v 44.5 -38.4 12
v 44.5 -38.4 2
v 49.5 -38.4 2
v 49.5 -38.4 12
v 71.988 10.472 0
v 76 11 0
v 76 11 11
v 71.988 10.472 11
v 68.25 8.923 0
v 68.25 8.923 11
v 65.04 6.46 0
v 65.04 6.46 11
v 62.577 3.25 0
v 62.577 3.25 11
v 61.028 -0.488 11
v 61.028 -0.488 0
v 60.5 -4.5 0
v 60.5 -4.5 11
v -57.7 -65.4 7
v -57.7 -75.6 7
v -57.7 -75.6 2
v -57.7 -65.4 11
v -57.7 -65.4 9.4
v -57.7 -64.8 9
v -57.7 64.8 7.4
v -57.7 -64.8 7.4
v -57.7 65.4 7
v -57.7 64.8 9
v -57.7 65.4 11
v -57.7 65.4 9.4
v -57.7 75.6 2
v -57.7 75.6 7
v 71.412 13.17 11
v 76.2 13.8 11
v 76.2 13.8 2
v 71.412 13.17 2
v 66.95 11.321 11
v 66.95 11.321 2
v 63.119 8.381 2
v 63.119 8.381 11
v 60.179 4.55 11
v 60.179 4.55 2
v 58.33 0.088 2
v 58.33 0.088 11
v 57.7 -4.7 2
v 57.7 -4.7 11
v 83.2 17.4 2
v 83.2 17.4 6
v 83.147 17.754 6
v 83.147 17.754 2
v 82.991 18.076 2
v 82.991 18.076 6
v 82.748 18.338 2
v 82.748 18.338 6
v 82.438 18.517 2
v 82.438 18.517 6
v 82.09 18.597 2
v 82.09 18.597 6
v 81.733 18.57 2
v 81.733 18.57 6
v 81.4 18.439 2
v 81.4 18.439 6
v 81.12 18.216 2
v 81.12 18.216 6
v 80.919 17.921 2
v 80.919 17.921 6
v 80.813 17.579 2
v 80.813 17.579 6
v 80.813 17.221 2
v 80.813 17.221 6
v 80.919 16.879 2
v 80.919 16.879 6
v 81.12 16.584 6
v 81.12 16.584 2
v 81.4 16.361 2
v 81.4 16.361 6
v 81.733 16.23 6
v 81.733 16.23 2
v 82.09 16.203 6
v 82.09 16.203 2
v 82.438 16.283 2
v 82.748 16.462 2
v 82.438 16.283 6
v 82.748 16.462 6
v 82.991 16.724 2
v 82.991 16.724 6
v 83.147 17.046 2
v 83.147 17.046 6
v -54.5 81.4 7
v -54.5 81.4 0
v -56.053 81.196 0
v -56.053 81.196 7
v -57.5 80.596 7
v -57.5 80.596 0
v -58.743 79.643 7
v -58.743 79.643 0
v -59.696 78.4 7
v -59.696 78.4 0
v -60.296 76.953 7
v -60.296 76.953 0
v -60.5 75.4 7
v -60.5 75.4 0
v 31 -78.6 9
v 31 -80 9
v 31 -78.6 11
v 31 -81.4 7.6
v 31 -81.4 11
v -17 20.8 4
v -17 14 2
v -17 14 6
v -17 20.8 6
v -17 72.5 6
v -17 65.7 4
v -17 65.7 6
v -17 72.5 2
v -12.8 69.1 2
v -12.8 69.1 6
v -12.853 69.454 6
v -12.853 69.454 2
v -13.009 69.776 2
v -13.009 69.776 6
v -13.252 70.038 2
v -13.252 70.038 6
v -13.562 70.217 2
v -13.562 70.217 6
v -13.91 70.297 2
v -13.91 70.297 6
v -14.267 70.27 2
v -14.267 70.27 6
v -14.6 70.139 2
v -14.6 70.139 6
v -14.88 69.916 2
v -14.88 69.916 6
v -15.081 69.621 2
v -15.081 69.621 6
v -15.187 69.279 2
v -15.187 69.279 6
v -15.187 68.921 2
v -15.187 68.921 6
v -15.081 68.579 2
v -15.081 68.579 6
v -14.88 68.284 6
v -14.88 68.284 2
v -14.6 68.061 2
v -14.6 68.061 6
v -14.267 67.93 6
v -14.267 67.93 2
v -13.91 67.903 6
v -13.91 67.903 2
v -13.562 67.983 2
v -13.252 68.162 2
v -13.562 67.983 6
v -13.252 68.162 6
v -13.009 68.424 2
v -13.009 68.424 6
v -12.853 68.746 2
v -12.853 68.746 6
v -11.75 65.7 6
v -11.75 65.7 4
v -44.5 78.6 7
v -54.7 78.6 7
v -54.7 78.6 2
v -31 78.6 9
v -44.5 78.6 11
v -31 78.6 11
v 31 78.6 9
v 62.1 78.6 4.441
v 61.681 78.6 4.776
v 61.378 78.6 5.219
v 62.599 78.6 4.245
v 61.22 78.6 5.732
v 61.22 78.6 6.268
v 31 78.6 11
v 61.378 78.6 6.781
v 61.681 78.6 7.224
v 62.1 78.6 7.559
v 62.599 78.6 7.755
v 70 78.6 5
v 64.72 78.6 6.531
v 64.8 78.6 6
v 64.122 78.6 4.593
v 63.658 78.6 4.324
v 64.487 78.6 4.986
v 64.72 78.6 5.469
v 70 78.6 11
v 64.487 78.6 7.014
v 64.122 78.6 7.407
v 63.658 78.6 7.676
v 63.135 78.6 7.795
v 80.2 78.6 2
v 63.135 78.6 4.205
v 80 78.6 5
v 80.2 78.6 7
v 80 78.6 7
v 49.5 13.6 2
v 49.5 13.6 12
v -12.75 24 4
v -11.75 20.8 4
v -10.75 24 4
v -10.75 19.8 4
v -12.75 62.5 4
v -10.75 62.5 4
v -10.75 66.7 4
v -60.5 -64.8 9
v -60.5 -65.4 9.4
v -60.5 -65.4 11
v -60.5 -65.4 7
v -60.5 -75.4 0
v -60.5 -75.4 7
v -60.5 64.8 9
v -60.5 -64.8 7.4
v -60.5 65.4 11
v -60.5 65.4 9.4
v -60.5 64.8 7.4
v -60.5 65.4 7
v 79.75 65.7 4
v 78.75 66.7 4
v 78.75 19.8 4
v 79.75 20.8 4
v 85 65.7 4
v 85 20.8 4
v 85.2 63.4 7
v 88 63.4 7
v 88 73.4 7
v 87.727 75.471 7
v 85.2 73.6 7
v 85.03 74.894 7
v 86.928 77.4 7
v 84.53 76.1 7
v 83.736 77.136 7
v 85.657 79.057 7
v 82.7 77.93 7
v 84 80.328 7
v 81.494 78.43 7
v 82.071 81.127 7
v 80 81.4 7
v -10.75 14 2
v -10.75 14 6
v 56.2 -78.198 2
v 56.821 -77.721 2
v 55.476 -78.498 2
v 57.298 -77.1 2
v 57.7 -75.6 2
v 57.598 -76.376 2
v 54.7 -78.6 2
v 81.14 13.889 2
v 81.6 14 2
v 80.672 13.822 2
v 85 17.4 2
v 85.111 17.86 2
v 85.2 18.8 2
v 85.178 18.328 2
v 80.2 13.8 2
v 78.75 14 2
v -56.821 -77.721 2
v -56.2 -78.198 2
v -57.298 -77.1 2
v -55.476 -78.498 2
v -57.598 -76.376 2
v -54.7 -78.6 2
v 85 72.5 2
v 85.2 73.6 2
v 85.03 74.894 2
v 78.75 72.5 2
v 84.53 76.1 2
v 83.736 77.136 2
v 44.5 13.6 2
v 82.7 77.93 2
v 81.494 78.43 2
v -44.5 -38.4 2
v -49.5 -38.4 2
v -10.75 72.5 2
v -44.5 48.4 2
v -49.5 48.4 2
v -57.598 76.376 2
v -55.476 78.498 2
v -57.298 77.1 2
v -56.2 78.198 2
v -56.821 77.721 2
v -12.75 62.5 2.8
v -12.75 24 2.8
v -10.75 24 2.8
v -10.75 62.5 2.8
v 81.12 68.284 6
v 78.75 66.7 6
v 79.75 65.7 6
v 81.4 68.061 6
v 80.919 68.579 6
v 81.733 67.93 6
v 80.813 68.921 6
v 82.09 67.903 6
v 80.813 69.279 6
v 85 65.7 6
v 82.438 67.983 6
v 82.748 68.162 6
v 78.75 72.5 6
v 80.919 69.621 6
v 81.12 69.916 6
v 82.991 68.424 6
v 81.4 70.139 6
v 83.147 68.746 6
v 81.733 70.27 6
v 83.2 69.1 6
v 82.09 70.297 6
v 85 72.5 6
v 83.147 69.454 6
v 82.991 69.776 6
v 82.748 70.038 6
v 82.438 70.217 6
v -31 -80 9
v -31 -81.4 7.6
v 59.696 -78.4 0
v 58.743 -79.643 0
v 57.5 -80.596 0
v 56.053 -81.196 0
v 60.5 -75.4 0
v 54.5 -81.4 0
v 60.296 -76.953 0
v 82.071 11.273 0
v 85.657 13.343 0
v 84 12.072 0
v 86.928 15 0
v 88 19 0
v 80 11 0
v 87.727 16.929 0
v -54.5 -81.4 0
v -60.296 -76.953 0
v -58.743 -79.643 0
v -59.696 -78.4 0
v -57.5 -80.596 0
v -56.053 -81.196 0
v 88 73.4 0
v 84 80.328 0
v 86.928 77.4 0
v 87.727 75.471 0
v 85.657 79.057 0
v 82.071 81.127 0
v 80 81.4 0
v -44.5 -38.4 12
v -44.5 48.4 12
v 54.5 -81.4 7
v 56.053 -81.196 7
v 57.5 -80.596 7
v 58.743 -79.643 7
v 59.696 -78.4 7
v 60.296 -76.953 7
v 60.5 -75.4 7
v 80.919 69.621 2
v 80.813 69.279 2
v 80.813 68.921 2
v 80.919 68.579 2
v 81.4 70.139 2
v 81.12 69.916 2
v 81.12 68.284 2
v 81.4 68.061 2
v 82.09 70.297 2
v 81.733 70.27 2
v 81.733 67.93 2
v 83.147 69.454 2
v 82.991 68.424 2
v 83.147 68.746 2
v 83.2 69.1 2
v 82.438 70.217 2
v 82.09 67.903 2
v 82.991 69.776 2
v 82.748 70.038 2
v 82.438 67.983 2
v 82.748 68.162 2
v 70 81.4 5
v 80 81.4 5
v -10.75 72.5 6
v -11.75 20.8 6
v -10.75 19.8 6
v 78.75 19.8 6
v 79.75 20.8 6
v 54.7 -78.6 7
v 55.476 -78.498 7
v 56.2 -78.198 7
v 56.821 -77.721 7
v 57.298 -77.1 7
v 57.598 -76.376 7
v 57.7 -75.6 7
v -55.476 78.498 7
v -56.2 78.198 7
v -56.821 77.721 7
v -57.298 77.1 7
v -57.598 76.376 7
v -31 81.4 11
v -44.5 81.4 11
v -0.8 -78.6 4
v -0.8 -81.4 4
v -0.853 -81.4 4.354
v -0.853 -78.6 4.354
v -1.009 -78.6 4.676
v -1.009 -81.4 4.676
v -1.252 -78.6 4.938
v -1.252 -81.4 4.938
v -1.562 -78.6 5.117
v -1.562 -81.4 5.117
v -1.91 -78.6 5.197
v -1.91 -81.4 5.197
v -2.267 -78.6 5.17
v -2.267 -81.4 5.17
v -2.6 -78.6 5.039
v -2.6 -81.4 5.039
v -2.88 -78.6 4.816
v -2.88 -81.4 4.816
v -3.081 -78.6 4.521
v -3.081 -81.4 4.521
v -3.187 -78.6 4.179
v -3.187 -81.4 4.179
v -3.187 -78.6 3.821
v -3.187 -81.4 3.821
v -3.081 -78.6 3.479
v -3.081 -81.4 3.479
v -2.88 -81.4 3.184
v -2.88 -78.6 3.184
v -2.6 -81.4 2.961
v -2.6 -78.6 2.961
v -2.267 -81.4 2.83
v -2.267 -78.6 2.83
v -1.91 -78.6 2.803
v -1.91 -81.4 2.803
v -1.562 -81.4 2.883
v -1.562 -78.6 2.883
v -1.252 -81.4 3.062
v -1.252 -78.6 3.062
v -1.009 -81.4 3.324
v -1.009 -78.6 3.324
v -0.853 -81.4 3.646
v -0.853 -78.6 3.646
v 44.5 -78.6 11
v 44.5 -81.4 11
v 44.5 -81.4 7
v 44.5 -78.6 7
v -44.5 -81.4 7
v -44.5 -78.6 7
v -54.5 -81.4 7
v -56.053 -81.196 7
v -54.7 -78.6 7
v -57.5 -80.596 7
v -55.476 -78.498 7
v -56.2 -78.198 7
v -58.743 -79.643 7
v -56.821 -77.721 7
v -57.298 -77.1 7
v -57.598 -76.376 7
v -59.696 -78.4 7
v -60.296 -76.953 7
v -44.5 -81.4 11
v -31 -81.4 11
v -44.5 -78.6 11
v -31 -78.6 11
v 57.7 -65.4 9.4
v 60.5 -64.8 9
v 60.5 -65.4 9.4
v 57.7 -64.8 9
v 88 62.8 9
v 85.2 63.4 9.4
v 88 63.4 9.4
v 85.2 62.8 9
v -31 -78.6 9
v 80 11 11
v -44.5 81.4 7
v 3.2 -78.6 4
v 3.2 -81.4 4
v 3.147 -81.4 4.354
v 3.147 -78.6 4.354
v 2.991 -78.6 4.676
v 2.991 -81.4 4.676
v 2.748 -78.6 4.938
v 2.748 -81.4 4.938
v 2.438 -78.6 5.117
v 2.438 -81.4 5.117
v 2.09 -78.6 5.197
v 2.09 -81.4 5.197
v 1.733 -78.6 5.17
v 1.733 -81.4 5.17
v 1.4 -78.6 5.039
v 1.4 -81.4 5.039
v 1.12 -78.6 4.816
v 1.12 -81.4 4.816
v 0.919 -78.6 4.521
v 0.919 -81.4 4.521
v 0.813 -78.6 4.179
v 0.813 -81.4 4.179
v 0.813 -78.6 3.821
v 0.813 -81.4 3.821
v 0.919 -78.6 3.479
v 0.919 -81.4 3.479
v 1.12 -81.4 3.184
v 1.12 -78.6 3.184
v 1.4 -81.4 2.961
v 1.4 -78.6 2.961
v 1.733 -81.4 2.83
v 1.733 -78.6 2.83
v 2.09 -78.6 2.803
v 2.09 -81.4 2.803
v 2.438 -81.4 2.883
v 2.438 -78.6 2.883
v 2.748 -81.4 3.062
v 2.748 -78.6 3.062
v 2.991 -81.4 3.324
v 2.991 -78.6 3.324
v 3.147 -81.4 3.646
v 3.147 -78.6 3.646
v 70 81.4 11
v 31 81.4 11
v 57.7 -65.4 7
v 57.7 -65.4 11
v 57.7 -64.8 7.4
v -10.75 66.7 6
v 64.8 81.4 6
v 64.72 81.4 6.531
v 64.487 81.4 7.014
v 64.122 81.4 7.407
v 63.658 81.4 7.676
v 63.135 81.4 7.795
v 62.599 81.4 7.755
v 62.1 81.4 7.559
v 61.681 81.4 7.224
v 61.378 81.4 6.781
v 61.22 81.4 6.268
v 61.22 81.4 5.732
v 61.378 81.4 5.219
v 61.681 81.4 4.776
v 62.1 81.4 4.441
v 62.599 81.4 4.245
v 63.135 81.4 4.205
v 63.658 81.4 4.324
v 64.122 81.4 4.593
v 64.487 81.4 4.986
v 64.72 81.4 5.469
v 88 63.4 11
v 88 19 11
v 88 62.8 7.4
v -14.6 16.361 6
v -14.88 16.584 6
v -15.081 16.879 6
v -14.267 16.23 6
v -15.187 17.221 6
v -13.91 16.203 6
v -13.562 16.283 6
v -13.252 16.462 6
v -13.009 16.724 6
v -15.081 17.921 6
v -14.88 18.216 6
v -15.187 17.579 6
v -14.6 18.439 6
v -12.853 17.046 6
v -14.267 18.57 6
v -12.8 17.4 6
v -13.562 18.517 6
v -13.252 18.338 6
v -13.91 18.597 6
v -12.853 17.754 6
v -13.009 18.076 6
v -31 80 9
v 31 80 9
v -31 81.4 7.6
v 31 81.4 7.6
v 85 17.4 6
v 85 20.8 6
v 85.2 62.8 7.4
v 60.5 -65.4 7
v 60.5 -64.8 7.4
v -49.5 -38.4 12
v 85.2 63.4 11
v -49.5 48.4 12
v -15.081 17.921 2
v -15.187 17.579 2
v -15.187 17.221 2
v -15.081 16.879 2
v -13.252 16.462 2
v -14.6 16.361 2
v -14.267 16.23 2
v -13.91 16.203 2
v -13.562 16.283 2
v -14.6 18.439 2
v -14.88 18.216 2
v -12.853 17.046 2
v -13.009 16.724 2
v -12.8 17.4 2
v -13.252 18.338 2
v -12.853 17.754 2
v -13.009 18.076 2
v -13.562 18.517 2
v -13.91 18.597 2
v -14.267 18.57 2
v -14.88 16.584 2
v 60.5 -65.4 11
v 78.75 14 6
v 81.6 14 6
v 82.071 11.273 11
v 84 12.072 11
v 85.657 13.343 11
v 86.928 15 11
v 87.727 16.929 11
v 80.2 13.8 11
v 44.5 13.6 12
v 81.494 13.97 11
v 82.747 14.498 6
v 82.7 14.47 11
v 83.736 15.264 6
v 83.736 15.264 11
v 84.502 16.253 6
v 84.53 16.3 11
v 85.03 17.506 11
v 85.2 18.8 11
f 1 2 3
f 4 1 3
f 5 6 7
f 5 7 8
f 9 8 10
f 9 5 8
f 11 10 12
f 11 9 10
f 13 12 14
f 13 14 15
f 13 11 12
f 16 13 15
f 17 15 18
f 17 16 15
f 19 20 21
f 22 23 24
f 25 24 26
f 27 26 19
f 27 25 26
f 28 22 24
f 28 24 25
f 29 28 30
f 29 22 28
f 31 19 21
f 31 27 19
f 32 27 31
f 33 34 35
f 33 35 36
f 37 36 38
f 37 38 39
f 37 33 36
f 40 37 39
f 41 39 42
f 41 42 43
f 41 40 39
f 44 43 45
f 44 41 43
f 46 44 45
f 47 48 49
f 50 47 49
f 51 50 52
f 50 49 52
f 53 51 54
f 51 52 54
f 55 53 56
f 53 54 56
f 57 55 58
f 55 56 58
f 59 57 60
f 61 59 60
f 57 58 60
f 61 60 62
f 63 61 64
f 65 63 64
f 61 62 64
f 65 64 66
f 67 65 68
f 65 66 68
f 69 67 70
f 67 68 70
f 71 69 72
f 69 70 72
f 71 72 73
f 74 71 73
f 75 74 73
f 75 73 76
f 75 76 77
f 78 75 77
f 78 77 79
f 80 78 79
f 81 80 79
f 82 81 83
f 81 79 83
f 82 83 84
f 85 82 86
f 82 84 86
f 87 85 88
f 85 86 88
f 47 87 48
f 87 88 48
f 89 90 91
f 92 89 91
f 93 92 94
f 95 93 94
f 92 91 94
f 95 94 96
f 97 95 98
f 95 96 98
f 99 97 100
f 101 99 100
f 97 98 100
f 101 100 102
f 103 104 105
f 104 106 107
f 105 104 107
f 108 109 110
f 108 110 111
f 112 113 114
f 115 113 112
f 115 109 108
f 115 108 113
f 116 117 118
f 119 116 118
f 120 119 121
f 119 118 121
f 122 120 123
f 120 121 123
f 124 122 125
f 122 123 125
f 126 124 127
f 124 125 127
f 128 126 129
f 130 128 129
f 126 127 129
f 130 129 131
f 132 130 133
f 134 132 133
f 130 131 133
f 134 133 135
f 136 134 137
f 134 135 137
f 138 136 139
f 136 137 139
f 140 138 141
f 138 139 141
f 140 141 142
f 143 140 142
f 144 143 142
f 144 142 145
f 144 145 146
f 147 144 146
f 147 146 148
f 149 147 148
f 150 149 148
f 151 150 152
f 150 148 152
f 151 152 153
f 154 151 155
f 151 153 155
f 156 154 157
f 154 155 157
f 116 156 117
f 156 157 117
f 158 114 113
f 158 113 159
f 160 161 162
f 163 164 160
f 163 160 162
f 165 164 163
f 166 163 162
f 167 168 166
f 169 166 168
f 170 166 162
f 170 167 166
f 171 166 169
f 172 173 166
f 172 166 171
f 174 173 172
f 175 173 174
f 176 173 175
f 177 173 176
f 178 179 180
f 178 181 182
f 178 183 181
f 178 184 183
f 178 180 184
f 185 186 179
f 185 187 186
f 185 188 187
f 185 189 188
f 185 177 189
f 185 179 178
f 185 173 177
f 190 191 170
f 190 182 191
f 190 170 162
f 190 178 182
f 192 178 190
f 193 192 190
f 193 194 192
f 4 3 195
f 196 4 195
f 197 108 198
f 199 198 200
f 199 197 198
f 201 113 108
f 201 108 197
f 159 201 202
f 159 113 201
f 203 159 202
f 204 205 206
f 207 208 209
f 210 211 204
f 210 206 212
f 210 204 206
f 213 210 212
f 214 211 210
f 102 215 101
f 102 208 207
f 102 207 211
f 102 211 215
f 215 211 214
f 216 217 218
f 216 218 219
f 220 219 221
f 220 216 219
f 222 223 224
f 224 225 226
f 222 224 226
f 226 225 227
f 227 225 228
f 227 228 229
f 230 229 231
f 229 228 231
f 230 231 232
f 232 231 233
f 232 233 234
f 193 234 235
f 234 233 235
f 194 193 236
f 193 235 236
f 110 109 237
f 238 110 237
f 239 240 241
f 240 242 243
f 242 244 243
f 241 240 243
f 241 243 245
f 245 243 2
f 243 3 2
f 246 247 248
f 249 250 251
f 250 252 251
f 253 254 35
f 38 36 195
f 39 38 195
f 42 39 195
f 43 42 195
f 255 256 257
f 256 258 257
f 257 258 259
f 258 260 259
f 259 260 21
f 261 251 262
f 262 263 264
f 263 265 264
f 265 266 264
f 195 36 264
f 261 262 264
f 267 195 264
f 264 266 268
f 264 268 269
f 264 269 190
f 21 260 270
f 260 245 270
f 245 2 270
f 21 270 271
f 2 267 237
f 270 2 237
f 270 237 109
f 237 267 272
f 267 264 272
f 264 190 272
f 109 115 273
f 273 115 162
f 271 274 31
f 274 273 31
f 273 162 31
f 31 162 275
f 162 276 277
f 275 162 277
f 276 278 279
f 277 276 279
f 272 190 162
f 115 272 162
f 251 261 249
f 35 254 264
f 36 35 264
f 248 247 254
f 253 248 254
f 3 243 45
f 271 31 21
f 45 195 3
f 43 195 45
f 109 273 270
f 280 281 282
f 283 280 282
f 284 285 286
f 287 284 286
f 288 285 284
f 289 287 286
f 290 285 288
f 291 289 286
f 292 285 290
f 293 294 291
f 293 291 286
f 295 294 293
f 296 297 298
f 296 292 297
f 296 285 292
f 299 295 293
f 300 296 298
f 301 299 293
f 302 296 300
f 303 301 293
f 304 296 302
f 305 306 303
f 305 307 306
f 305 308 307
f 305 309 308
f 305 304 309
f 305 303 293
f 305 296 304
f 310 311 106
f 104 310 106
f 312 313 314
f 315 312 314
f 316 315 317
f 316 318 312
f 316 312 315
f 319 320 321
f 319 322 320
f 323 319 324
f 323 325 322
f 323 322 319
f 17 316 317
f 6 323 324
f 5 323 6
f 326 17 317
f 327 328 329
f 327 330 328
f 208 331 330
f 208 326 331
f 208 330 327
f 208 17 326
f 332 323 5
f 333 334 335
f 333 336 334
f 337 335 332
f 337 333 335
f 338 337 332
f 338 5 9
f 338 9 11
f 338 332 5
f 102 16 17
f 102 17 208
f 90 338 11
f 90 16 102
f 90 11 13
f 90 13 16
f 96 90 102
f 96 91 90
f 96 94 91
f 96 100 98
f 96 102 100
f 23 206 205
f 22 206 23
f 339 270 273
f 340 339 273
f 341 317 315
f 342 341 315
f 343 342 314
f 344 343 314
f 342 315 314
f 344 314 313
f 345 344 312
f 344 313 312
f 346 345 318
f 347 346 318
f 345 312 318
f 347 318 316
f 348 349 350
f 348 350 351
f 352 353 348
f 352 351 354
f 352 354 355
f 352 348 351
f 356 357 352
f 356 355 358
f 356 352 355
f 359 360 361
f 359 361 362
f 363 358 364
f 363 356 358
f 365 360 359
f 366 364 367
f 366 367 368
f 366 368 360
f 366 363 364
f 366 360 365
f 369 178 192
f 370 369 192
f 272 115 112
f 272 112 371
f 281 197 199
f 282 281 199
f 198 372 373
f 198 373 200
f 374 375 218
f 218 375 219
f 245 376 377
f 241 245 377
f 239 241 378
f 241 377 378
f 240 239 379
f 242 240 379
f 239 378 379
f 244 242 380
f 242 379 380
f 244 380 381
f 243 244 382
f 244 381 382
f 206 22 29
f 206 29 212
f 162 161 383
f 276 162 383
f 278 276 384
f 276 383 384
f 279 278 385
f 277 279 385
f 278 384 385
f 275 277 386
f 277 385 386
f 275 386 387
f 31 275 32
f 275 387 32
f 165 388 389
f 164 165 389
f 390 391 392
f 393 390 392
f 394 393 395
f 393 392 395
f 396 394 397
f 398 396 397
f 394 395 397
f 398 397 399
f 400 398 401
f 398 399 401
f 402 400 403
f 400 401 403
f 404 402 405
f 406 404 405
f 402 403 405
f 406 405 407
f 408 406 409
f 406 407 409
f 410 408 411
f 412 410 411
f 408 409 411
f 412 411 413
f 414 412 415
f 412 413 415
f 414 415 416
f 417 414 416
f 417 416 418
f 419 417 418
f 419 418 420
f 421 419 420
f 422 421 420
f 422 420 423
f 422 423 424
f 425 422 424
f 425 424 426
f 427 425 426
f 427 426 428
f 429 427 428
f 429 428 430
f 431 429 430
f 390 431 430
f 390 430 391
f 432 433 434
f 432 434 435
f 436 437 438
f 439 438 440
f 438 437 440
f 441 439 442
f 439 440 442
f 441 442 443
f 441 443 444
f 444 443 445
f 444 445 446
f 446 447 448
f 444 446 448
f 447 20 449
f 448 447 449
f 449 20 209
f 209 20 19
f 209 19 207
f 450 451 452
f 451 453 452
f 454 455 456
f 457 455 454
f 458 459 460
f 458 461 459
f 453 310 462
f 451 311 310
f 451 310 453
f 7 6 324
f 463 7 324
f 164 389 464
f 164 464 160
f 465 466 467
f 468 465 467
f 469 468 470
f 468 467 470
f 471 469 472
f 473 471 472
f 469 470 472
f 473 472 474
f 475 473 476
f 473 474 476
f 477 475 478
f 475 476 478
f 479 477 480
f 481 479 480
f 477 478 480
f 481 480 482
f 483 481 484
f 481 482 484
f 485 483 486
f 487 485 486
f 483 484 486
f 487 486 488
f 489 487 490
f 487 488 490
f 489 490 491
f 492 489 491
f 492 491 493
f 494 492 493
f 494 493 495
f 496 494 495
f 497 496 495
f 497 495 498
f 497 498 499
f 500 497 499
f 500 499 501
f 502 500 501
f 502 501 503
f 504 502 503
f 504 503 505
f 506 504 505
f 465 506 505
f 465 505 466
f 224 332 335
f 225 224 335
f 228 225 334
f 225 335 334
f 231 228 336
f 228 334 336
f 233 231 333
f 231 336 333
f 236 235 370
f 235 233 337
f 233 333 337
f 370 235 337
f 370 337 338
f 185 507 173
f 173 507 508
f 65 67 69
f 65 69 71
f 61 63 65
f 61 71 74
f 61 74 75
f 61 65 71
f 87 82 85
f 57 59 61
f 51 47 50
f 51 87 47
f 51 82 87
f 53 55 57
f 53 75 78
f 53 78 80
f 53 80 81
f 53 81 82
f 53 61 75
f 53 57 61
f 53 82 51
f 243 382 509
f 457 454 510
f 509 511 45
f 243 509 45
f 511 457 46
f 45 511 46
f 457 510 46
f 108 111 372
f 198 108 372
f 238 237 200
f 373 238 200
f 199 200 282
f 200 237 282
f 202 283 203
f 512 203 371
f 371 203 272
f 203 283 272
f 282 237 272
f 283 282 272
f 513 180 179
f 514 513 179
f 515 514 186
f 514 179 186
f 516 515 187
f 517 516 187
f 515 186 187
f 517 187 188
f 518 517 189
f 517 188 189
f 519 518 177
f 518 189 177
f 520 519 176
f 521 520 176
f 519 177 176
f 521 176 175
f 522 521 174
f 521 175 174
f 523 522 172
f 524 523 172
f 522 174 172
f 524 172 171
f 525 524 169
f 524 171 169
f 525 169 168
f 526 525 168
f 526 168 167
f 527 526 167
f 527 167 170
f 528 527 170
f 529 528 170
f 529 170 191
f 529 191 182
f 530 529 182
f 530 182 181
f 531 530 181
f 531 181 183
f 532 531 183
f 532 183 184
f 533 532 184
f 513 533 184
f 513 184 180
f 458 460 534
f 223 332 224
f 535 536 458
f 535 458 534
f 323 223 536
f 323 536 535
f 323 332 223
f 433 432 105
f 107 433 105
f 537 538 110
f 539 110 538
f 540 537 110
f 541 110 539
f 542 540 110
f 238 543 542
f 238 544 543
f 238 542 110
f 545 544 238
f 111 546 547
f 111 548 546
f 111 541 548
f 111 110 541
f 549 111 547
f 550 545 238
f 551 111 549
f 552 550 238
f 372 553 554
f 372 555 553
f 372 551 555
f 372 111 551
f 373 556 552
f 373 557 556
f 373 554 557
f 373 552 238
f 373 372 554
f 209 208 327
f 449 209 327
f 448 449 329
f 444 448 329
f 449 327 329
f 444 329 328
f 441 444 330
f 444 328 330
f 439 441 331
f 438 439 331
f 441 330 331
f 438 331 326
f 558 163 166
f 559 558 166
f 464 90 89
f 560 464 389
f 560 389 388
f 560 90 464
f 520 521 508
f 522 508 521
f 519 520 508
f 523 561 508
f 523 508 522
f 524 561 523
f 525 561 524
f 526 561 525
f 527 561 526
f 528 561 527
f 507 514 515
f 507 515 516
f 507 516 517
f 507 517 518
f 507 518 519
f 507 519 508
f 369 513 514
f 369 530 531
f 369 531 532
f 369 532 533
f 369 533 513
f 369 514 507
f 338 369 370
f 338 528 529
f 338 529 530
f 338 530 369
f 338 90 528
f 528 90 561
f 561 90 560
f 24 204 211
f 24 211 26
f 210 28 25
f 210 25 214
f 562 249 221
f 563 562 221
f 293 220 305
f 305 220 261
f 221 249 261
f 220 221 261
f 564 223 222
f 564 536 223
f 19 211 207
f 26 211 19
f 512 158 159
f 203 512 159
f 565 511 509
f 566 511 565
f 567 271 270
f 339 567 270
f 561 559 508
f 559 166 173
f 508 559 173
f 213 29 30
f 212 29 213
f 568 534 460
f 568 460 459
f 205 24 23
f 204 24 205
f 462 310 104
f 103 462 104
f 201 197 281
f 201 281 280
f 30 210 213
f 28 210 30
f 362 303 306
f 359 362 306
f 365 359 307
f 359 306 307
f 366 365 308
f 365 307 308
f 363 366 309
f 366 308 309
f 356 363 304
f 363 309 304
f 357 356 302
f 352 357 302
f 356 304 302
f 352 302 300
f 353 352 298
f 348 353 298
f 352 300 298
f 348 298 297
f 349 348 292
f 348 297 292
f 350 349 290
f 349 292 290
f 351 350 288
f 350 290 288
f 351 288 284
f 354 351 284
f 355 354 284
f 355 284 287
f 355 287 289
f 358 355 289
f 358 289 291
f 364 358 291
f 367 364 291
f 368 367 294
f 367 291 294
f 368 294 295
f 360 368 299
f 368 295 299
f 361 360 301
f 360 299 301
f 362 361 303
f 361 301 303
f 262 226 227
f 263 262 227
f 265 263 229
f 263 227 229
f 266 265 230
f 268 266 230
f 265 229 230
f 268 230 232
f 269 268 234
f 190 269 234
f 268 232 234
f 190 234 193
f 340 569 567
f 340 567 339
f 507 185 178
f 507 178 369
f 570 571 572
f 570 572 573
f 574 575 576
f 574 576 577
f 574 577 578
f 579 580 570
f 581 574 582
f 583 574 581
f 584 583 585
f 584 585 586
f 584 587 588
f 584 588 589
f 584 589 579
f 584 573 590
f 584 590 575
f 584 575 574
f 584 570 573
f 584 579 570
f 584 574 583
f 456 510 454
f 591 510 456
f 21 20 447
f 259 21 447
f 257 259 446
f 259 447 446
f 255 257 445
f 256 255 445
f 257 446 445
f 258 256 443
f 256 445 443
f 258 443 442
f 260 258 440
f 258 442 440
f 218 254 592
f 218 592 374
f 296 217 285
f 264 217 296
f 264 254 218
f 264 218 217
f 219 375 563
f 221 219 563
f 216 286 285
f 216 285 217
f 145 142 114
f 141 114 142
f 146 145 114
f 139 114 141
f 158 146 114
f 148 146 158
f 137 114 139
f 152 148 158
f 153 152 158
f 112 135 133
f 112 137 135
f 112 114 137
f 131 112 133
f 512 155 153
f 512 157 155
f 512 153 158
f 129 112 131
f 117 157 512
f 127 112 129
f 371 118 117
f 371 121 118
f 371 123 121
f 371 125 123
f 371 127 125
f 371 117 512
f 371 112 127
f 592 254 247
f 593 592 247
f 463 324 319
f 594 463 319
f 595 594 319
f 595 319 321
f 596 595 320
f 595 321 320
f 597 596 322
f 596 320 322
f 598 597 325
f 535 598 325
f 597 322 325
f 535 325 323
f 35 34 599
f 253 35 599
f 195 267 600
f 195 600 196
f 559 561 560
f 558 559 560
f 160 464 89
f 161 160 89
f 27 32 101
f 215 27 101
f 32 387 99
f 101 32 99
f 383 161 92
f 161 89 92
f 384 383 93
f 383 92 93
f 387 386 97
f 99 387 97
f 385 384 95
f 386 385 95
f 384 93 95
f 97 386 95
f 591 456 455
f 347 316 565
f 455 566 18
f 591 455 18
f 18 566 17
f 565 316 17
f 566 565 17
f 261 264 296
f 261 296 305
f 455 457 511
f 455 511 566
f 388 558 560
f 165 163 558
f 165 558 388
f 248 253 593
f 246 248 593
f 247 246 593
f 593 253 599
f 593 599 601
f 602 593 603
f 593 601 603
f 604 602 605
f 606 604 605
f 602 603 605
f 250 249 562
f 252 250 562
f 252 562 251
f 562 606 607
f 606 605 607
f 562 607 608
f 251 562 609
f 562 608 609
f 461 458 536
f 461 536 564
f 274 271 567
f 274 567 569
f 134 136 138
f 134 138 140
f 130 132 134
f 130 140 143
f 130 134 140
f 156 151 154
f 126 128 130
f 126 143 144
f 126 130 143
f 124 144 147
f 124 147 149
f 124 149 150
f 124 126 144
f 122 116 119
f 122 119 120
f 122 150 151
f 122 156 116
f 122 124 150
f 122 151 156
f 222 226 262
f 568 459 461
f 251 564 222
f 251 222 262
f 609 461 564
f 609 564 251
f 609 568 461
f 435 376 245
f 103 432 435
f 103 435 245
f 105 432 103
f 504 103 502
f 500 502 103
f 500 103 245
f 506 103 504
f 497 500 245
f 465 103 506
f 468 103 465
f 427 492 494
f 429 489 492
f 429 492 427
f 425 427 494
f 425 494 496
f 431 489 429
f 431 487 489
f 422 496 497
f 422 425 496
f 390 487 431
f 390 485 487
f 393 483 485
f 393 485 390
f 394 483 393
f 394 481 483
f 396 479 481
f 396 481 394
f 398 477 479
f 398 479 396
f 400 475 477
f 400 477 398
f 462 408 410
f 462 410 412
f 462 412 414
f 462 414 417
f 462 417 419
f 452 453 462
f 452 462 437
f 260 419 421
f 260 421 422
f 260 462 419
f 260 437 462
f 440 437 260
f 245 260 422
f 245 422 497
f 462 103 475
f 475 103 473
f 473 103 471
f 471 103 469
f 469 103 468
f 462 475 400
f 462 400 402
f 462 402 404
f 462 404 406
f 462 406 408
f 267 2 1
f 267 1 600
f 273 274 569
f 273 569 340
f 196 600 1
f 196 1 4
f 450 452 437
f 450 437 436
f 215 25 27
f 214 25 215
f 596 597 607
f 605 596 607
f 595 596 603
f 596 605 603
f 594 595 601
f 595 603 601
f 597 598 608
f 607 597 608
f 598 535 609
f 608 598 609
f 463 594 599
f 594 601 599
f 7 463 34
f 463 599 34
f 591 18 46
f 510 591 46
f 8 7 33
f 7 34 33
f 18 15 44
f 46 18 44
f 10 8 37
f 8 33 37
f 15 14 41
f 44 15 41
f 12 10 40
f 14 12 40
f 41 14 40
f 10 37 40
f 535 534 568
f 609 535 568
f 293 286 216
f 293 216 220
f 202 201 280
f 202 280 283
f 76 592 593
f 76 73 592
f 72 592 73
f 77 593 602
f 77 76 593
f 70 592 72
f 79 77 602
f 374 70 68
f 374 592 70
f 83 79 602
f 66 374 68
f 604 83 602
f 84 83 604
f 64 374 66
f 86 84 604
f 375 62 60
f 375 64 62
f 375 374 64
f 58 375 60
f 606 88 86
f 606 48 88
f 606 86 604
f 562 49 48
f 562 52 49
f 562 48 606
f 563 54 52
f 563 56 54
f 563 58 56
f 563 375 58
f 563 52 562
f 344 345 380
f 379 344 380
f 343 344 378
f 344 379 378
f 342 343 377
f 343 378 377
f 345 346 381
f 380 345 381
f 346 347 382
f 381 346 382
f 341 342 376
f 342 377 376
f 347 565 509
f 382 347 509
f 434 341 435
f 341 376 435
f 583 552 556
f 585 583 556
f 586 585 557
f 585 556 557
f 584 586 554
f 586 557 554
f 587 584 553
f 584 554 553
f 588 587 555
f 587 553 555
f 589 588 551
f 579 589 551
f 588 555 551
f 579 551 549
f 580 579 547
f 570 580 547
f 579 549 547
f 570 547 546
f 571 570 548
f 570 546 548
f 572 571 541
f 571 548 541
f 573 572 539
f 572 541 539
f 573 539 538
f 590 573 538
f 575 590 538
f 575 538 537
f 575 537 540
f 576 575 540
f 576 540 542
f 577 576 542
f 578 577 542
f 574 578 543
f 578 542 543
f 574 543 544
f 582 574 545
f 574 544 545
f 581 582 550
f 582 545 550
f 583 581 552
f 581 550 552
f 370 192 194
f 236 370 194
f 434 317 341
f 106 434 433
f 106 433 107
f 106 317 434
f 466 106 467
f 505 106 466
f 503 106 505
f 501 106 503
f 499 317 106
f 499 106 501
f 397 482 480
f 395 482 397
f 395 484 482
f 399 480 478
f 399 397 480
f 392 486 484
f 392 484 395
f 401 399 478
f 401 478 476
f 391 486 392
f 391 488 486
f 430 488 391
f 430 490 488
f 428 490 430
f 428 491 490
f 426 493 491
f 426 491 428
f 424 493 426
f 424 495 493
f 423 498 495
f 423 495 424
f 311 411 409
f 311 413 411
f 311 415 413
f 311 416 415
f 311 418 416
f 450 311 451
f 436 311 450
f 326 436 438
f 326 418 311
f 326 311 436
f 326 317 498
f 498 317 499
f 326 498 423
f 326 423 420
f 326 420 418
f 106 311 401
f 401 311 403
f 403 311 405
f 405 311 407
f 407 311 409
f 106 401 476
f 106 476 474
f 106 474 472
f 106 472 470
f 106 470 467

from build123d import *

# Parameters (mm, degrees)
PAD008_DEPTH    = 11
POCKET005_DEPTH = 9
SKETCH019_W     = 6.25
SKETCH019_H     = 58.5
PAD009_DEPTH    = 4
SKETCH020_W     = 6.25
SKETCH020_H     = 44.9
POCKET008_DEPTH = 2
SKETCH021_W     = 5
SKETCH021_H     = 86.8
SKETCH021_H_2   = 52
PAD010_DEPTH    = 10
SKETCH024_W     = 62
SKETCH024_H     = 2
POCKET011_DEPTH = 162.801
POCKET012_DEPTH = 4
SKETCH027_W     = 2.8
SKETCH027_H     = 2.4
SKETCH032_W     = 2.8
SKETCH032_H     = 1.6
SKETCH030_W     = 2.8
SKETCH030_H     = 2.4
SKETCH033_W     = 2.8
SKETCH033_H     = 1.6
SKETCH029_W     = 2.8
SKETCH029_H     = 2.4
SKETCH034_W     = 2.8
SKETCH034_H     = 1.6
SKETCH028_W     = 2.8
SKETCH028_H     = 2.4
SKETCH044_W     = 2.8
SKETCH044_H     = 1.6
CHAMFER_SIZE    = 1
SKETCH053_R     = 1.2
POCKET013_DEPTH = 4
SKETCH057_R     = 1.2
POCKET015_DEPTH = 3
SKETCH072_R     = 1.8
SKETCH072_W     = 10
SKETCH072_H     = 2
POCKET024_DEPTH = 3
SKETCH073_W     = 2
SKETCH073_H     = 38.5
POCKET025_DEPTH = 1.2
CHAMFER005_SIZE = 1.4


with BuildPart() as part:
    # Sketch015 → Pad008 (new body)
    with BuildSketch(Plane.XY):
        with BuildLine():
            Line((-54.5, 81.4), (80, 81.4))
            ThreePointArc((88, 73.4), (85.656854, 79.056854), (80, 81.4))
            Line((88, 73.4), (88, 19))
            ThreePointArc((80, 11), (85.656854, 13.343146), (88, 19))
            Line((76, 11), (80, 11))
            ThreePointArc((76, 11), (65.039845, 6.460155), (60.5, -4.5))
            Line((60.5, -75.4), (60.5, -4.5))
            ThreePointArc((54.5, -81.4), (58.742641, -79.642641), (60.5, -75.4))
            Line((54.5, -81.4), (-54.5, -81.4))
            ThreePointArc((-60.5, -75.4), (-58.742641, -79.642641), (-54.5, -81.4))
            Line((-60.5, -75.4), (-60.5, 75.4))
            ThreePointArc((-54.5, 81.4), (-58.742641, 79.642641), (-60.5, 75.4))
        make_face()
    extrude(amount=PAD008_DEPTH)

    # Sketch016 (on Face14 of Pad008) → Pocket005 (cut)
    with BuildSketch(Plane.XY.offset(11)):
        with BuildLine():
            Line((-54.7, 78.6), (80.2, 78.6))
            ThreePointArc((85.2, 73.6), (83.735534, 77.135534), (80.2, 78.6))
            Line((85.2, 73.6), (85.2, 18.8))
            ThreePointArc((80.2, 13.8), (83.735534, 15.264466), (85.2, 18.8))
            Line((76.2, 13.8), (80.2, 13.8))
            ThreePointArc((76.2, 13.8), (63.118525, 8.381475), (57.7, -4.7))
            Line((57.7, -75.6), (57.7, -4.7))
            ThreePointArc((54.7, -78.6), (56.82132, -77.72132), (57.7, -75.6))
            Line((54.7, -78.6), (-54.7, -78.6))
            ThreePointArc((-57.7, -75.6), (-56.82132, -77.72132), (-54.7, -78.6))
            Line((-57.7, -75.6), (-57.7, 75.6))
            ThreePointArc((-54.7, 78.6), (-56.82132, 77.72132), (-57.7, 75.6))
        make_face()
    extrude(amount=-POCKET005_DEPTH, mode=Mode.SUBTRACT)

    # Sketch019 (on Face27 of Pocket005) → Pad009 (join)
    with BuildSketch(Plane.XY.offset(2)):
        with Locations((-13.875, 43.25)):
            Rectangle(SKETCH019_W, SKETCH019_H)
        with Locations((81.875, 43.25)):
            Rectangle(SKETCH019_W, SKETCH019_H)
    extrude(amount=PAD009_DEPTH)

    # Sketch020 (on Face37 of Pad009) → Pocket008 (cut)
    with BuildSketch(Plane.XY.offset(6)):
        with Locations((-13.875, 43.25)):
            Rectangle(SKETCH020_W, SKETCH020_H)
        with Locations((81.875, 43.25)):
            Rectangle(SKETCH020_W, SKETCH020_H)
    extrude(amount=-POCKET008_DEPTH, mode=Mode.SUBTRACT)

    # Sketch021 (on Face27 of Pocket008) → Pad010 (join)
    with BuildSketch(Plane.XY.offset(2)):
        with Locations((-47, 5)):
            Rectangle(SKETCH021_W, SKETCH021_H)
        with Locations((47, -12.4)):
            Rectangle(SKETCH021_W, SKETCH021_H_2)
    extrude(amount=PAD010_DEPTH)

    # Sketch024 (on Face6 of Pad010) → Pocket011 (cut, through all)
    with BuildSketch(Plane.XZ.offset(81.4)):
        with Locations((0, 10)):
            Rectangle(SKETCH024_W, SKETCH024_H)
    extrude(amount=-POCKET011_DEPTH, mode=Mode.SUBTRACT)

    # Sketch025 (on Face5 of Pocket011) → Pocket012 (cut)
    with BuildSketch(Plane.XY.offset(11)):
        with BuildLine():
            Line((-54.5, 81.4), (-44.5, 81.4))
            Line((-44.5, 81.4), (-44.5, 78.6))
            Line((-54.7, 78.6), (-44.5, 78.6))
            ThreePointArc((-54.7, 78.6), (-56.82132, 77.72132), (-57.7, 75.6))
            Line((-57.7, 65.4), (-57.7, 75.6))
            Line((-57.7, 65.4), (-60.5, 65.4))
            Line((-60.5, 65.4), (-60.5, 75.4))
            ThreePointArc((-54.5, 81.4), (-58.742641, 79.642641), (-60.5, 75.4))
        make_face()
        with BuildLine():
            Line((70, 81.4), (80, 81.4))
            ThreePointArc((88, 73.4), (85.656854, 79.056854), (80, 81.4))
            Line((88, 73.4), (88, 63.4))
            Line((88, 63.4), (85.2, 63.4))
            Line((85.2, 73.4), (85.2, 63.4))
            ThreePointArc((85.2, 73.4), (83.676955, 77.076955), (80, 78.6))
            Line((70, 78.6), (80, 78.6))
            Line((70, 78.6), (70, 81.4))
        make_face()
        with BuildLine():
            Line((-60.5, -65.4), (-57.7, -65.4))
            Line((-57.7, -75.6), (-57.7, -65.4))
            ThreePointArc((-57.7, -75.6), (-56.82132, -77.72132), (-54.7, -78.6))
            Line((-44.5, -78.6), (-54.7, -78.6))
            Line((-44.5, -78.6), (-44.5, -81.4))
            Line((-44.5, -81.4), (-54.5, -81.4))
            ThreePointArc((-60.5, -75.4), (-58.742641, -79.642641), (-54.5, -81.4))
            Line((-60.5, -75.4), (-60.5, -65.4))
        make_face()
        with BuildLine():
            Line((57.7, -65.4), (60.5, -65.4))
            Line((60.5, -65.4), (60.5, -75.4))
            ThreePointArc((54.5, -81.4), (58.742641, -79.642641), (60.5, -75.4))
            Line((54.5, -81.4), (44.5, -81.4))
            Line((44.5, -81.4), (44.5, -78.6))
            Line((54.7, -78.6), (44.5, -78.6))
            ThreePointArc((54.7, -78.6), (56.82132, -77.72132), (57.7, -75.6))
            Line((57.7, -65.4), (57.7, -75.6))
        make_face()
    extrude(amount=-POCKET012_DEPTH, mode=Mode.SUBTRACT)

    # Sketch027 (on Face35 of Pocket012) → SubtractiveLoft section 0
    with BuildSketch(Plane.XZ.offset(65.4)):
        with Locations((-59.1, 8.2)):
            Rectangle(SKETCH027_W, SKETCH027_H)
    # Sketch032 (on DatumPlane) → SubtractiveLoft section 1
    with BuildSketch(Plane.XZ.offset(64.8)):
        with Locations((-59.1, 8.2)):
            Rectangle(SKETCH032_W, SKETCH032_H)
    loft(mode=Mode.SUBTRACT)

    # Sketch030 (on Face35 of Pocket012) → SubtractiveLoft001 section 0
    with BuildSketch(Plane.XZ.offset(65.4)):
        with Locations((59.1, 8.2)):
            Rectangle(SKETCH030_W, SKETCH030_H)
    # Sketch033 (on DatumPlane) → SubtractiveLoft001 section 1
    with BuildSketch(Plane.XZ.offset(64.8)):
        with Locations((59.1, 8.2)):
            Rectangle(SKETCH033_W, SKETCH033_H)
    loft(mode=Mode.SUBTRACT)

    # Sketch029 → SubtractiveLoft002 section 0
    with BuildSketch(Plane(origin=(0, 65.4, 0), x_dir=(-1, 0, 0), z_dir=(0, 1, 0))):
        with Locations((59.1, 8.2)):
            Rectangle(SKETCH029_W, SKETCH029_H)
    # Sketch034 (on DatumPlane) → SubtractiveLoft002 section 1
    with BuildSketch(Plane(origin=(0, 64.8, 0), x_dir=(-1, 0, 0), z_dir=(0, 1, 0))):
        with Locations((59.1, 8.2)):
            Rectangle(SKETCH034_W, SKETCH034_H)
    loft(mode=Mode.SUBTRACT)

    # Sketch028 → SubtractiveLoft003 section 0
    with BuildSketch(Plane(origin=(0, 63.4, 0), x_dir=(-1, 0, 0), z_dir=(0, 1, 0))):
        with Locations((-86.6, 8.2)):
            Rectangle(SKETCH028_W, SKETCH028_H)
    # Sketch044 (on DatumPlane) → SubtractiveLoft003 section 1
    with BuildSketch(Plane(origin=(0, 62.8, 0), x_dir=(-1, 0, 0), z_dir=(0, 1, 0))):
        with Locations((-86.6, 8.2)):
            Rectangle(SKETCH044_W, SKETCH044_H)
    loft(mode=Mode.SUBTRACT)

    # Chamfer
    chamfer_edges = [part.edges().sort_by_distance(p)[0] for p in [
        (-10.75, 20.8, 5),
        (-10.75, 65.7, 5),
        (78.75, 65.7, 5),
        (78.75, 20.8, 5),
    ]]
    chamfer(chamfer_edges, length=CHAMFER_SIZE)

    # Sketch053 (on Face74 of Chamfer) → Pocket013 (cut)
    with BuildSketch(Plane.XY.offset(6)):
        with Locations((-14, 69.1)):
            Circle(SKETCH053_R)
        with Locations((-14, 17.4)):
            Circle(SKETCH053_R)
        with Locations((82, 17.4)):
            Circle(SKETCH053_R)
        with Locations((82, 69.1)):
            Circle(SKETCH053_R)
    extrude(amount=-POCKET013_DEPTH, mode=Mode.SUBTRACT)

    # Sketch057 (on Face87 of Pocket013) → Pocket015 (cut)
    with BuildSketch(Plane.XZ.offset(81.4)):
        with Locations((-2, 4)):
            Circle(SKETCH057_R)
        with Locations((2, 4)):
            Circle(SKETCH057_R)
    extrude(amount=-POCKET015_DEPTH, mode=Mode.SUBTRACT)

    # Sketch072 (on Face19 of Pocket015) → Pocket024 (cut)
    with BuildSketch(Plane.XZ.offset(-78.6)):
        with Locations((63, 6)):
            Circle(SKETCH072_R)
        with Locations((75, 6)):
            Rectangle(SKETCH072_W, SKETCH072_H)
    extrude(amount=-POCKET024_DEPTH, mode=Mode.SUBTRACT)

    # Sketch073 (on Face85 of Pocket024) → Pocket025 (cut)
    with BuildSketch(Plane.XY.offset(4)):
        with Locations((-11.75, 43.25)):
            Rectangle(SKETCH073_W, SKETCH073_H)
    extrude(amount=-POCKET025_DEPTH, mode=Mode.SUBTRACT)

    # Chamfer005
    chamfer005_edges = [part.edges().sort_by_distance(p)[0] for p in [
        (0, -81.4, 9),
        (0, 81.4, 9),
    ]]
    chamfer(chamfer005_edges, length=CHAMFER005_SIZE)


solid = part.part
